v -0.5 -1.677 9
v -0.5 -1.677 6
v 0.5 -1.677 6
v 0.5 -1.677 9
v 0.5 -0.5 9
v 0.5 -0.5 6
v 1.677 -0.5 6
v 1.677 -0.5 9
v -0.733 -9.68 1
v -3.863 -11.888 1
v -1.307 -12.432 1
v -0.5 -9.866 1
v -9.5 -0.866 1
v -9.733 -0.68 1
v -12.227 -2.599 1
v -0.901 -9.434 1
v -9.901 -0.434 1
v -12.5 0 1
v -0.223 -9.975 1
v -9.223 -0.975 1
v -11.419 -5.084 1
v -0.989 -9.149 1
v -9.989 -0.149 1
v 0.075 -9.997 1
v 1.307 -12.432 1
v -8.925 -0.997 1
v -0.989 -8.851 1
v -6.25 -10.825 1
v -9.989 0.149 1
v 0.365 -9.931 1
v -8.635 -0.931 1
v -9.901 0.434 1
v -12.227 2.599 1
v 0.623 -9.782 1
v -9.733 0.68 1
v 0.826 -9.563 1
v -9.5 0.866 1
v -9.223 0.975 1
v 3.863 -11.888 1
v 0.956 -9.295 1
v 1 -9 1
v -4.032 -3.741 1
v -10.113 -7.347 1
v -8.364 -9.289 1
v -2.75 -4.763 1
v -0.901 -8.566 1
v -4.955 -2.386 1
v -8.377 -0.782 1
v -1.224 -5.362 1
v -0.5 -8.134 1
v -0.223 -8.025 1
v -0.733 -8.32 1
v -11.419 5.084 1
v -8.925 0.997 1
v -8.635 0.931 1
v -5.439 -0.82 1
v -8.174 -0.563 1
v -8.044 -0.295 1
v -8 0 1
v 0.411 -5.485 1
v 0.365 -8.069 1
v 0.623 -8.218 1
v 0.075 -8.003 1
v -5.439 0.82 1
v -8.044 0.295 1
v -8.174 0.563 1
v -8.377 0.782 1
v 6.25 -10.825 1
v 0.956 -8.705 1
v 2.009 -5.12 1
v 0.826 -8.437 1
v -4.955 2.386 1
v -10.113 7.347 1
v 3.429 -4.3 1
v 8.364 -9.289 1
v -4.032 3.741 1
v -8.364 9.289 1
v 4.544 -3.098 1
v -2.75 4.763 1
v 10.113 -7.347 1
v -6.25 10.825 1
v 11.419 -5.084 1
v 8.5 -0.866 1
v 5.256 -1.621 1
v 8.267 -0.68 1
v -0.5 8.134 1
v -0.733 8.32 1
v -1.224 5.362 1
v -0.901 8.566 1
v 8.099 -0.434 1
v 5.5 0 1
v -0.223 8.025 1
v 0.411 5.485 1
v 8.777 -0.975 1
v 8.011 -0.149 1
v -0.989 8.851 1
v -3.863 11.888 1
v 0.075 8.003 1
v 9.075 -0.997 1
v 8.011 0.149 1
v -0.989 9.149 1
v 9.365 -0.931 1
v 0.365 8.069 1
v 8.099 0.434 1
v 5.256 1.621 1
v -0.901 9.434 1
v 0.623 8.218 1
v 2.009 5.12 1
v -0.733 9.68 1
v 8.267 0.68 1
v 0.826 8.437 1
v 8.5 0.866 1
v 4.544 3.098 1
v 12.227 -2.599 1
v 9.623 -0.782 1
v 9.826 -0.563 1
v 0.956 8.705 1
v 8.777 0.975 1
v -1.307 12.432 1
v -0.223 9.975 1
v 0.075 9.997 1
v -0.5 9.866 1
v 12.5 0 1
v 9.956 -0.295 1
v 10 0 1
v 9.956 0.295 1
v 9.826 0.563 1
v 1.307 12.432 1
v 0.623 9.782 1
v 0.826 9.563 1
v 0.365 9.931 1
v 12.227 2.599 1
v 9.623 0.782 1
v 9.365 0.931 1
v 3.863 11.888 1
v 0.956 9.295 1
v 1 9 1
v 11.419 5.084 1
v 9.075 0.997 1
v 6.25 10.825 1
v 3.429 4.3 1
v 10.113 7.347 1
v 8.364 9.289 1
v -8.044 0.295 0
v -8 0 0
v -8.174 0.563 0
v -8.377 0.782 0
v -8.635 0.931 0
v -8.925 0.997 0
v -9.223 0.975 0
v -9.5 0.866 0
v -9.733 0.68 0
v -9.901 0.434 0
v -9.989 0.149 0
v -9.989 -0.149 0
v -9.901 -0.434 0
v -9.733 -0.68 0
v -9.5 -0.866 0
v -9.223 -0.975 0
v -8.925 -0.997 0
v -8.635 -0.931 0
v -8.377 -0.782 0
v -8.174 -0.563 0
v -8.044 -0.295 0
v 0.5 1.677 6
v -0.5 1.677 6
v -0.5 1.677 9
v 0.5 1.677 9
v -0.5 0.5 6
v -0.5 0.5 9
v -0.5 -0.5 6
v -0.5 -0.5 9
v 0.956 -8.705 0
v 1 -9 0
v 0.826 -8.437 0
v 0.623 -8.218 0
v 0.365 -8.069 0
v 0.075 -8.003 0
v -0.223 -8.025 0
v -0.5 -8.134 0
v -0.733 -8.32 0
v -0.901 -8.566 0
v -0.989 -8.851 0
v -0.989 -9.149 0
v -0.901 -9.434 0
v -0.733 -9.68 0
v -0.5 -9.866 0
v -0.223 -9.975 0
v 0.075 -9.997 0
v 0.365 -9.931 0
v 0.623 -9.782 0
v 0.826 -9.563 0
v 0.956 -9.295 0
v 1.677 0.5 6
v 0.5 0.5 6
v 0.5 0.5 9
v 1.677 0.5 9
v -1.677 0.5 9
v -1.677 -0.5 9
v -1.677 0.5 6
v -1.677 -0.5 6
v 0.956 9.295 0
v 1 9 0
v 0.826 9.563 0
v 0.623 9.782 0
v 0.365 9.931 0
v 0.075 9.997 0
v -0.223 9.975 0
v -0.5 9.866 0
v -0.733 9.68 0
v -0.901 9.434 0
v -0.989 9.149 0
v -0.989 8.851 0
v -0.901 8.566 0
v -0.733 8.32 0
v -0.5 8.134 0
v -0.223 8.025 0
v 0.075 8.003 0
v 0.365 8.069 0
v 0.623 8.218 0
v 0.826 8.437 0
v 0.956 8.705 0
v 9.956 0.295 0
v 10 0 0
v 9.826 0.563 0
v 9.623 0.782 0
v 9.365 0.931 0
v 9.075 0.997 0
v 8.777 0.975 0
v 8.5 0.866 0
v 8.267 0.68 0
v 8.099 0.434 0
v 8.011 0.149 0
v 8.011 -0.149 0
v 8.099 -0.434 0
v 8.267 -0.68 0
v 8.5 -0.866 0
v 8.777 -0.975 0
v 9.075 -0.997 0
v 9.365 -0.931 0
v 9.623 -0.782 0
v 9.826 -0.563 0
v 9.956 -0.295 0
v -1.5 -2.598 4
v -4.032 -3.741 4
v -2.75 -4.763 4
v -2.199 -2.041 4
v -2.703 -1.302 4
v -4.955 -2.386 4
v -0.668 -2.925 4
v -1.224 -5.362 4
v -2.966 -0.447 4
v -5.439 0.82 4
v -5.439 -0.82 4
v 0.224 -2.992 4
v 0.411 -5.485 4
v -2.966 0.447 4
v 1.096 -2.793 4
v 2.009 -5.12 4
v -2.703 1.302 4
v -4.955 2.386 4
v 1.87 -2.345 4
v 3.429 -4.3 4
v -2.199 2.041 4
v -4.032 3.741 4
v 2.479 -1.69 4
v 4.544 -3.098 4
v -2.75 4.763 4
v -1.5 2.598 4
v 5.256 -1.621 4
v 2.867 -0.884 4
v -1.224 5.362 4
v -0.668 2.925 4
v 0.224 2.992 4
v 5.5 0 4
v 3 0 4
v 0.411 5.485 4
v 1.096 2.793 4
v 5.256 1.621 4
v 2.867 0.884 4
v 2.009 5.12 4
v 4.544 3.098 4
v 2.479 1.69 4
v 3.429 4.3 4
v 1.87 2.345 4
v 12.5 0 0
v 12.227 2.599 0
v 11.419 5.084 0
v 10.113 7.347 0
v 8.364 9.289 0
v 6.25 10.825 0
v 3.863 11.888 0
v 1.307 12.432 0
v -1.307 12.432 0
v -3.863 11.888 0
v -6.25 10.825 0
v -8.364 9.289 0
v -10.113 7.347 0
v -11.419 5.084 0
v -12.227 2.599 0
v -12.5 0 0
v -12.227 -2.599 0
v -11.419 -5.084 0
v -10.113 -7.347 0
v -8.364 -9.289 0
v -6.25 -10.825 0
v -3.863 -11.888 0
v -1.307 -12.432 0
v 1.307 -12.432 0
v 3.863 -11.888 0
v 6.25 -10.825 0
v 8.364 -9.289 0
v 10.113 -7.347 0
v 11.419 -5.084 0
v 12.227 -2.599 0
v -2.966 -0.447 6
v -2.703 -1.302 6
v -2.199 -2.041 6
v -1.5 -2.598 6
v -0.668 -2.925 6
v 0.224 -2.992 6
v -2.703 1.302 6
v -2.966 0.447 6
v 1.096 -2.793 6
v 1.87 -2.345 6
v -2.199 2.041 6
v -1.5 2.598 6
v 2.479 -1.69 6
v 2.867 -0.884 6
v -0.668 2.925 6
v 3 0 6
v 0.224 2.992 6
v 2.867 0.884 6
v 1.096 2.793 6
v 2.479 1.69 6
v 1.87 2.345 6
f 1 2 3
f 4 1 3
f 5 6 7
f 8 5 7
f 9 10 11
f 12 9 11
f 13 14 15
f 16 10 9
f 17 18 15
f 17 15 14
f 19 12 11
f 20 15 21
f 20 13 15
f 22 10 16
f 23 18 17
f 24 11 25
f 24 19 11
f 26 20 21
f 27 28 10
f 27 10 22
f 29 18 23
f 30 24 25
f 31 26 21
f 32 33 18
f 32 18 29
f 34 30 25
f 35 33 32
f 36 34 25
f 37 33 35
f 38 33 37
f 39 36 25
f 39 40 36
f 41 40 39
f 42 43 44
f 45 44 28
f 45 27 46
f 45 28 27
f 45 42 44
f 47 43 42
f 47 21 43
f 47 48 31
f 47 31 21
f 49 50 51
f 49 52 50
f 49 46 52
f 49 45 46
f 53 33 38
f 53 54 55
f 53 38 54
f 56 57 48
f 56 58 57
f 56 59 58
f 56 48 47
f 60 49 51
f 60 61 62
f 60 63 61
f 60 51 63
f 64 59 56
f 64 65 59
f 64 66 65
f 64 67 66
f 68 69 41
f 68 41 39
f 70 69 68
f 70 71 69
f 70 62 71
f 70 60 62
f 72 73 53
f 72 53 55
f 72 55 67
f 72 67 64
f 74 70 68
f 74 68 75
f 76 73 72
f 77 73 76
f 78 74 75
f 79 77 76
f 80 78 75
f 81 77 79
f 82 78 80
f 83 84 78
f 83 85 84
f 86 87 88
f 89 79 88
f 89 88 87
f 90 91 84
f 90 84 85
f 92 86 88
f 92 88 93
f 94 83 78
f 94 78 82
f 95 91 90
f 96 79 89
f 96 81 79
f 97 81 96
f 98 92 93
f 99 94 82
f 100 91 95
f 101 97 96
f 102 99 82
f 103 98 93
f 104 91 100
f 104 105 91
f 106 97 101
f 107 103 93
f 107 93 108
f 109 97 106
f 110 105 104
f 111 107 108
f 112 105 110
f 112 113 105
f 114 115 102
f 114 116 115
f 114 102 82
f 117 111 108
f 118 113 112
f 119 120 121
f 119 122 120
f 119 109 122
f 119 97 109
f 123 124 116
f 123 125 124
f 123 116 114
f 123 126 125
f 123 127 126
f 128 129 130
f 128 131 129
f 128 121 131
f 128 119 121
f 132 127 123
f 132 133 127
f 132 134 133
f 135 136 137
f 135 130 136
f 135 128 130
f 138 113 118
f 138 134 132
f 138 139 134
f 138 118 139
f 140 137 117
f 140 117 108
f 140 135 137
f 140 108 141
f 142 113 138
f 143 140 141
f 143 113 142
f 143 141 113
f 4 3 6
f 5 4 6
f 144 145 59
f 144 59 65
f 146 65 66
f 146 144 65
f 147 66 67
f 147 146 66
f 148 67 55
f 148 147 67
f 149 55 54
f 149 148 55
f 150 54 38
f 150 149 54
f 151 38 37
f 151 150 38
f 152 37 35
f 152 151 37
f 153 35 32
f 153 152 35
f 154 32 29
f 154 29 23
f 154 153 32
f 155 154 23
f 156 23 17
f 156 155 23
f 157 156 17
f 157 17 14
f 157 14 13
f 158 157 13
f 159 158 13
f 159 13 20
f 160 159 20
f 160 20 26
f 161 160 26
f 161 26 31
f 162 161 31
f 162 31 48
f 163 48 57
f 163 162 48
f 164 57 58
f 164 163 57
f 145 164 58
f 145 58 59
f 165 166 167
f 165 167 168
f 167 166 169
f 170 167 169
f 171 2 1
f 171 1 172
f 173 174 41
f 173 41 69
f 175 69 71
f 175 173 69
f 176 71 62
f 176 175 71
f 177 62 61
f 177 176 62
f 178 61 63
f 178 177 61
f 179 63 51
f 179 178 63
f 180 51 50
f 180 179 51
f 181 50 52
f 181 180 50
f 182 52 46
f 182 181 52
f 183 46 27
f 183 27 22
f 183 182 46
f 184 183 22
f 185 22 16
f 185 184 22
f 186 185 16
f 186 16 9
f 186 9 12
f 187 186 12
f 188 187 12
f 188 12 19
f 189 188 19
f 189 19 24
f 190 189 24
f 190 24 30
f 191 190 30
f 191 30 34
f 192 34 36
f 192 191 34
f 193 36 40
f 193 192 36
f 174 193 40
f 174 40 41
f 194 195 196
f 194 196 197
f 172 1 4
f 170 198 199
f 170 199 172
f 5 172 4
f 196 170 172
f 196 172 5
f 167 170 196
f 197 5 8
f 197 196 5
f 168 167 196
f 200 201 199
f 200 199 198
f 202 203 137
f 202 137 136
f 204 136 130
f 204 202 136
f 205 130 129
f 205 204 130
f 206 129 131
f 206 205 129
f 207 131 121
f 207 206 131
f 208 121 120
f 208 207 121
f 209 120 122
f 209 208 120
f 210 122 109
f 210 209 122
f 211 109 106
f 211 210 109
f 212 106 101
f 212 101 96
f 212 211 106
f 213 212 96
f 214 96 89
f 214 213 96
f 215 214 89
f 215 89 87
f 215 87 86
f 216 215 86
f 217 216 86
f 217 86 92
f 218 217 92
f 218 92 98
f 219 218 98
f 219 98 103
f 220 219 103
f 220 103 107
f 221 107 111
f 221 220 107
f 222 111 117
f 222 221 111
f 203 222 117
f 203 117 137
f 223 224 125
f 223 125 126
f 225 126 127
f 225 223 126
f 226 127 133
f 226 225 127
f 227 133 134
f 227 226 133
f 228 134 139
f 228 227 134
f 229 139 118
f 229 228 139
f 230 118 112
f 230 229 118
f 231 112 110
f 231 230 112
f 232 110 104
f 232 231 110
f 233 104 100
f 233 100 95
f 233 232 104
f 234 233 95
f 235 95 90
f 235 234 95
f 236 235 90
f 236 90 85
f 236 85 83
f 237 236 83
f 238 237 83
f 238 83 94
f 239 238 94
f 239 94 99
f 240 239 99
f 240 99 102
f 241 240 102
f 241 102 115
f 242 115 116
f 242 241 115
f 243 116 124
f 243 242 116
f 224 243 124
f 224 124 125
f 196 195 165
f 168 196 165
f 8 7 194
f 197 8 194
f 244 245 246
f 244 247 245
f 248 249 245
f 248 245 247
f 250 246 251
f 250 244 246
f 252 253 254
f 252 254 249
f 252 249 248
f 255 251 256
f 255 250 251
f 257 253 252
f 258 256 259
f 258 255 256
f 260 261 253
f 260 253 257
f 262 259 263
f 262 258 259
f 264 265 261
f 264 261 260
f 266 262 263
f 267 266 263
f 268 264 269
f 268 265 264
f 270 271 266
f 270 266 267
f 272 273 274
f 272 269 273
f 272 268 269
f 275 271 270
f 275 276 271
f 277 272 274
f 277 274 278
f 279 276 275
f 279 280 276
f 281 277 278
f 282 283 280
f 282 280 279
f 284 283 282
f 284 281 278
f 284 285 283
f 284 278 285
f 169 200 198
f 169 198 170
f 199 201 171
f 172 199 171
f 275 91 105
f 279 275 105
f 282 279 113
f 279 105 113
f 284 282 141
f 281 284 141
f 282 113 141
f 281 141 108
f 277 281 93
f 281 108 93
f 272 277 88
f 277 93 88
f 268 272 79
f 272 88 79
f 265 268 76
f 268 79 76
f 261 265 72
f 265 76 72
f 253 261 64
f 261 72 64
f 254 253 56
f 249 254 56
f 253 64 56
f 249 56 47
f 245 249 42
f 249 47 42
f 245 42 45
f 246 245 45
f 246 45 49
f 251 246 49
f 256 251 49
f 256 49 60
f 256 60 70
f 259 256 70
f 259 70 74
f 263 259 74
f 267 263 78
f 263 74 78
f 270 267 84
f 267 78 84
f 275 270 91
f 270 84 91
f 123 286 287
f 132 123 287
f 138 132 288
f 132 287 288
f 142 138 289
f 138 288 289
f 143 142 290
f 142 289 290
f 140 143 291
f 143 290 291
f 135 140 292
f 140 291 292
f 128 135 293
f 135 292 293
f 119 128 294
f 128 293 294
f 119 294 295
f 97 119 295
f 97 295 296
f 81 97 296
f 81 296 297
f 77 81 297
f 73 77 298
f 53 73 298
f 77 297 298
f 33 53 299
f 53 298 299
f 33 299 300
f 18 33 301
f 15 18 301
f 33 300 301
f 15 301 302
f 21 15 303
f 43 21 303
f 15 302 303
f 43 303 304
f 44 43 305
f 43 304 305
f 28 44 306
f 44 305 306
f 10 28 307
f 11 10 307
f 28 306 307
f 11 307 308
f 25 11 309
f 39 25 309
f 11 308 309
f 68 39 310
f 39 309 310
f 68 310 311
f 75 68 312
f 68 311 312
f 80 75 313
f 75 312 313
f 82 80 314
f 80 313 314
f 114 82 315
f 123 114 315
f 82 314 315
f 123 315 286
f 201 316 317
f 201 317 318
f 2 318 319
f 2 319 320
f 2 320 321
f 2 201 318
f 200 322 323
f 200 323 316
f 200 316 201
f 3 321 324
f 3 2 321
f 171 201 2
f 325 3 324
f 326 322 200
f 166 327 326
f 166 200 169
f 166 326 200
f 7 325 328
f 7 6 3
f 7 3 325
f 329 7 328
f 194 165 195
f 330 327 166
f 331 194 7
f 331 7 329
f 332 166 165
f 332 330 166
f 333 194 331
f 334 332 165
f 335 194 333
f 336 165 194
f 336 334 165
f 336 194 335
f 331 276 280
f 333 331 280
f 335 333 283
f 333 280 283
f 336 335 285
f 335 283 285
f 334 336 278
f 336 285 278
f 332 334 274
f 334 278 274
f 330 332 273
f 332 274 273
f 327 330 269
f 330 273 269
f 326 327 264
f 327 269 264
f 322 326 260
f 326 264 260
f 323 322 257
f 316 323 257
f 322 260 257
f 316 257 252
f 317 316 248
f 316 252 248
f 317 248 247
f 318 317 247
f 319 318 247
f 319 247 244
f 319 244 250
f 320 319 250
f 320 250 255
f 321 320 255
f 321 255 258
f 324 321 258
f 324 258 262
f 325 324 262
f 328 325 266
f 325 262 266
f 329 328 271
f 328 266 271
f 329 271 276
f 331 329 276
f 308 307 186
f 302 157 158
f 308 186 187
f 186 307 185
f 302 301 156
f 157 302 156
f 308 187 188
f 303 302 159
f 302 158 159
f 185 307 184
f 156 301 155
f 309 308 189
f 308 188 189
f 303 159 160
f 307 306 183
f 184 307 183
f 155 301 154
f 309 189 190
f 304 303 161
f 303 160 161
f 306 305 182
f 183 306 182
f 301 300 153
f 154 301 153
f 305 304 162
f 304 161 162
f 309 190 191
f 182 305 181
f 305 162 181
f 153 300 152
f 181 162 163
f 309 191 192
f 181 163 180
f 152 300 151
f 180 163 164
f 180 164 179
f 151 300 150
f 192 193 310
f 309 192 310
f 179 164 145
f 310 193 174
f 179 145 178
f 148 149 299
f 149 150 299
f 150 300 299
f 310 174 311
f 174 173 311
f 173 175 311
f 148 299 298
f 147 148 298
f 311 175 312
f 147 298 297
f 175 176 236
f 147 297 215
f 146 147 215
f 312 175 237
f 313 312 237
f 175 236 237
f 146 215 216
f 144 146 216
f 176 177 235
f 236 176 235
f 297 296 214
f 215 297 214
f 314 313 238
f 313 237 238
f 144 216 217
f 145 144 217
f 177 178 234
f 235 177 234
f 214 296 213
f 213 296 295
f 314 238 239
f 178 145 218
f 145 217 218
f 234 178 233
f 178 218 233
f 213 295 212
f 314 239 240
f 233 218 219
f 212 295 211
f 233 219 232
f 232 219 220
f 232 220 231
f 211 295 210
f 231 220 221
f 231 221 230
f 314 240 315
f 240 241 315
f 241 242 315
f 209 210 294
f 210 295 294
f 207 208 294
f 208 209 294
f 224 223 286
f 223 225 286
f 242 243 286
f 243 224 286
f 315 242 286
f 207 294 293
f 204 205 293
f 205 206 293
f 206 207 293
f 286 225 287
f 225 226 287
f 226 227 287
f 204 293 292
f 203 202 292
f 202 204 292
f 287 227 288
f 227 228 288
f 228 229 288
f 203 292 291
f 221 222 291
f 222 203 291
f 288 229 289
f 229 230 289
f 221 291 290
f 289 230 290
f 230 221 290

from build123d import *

# Parameters (mm, degrees)
F0_R     = 12.5
F0_R_2   = 1
F1_DEPTH = 1
F2_R     = 5.5
F3_DEPTH = 3
F4_R     = 3
F5_DEPTH = 2
F6_W     = 1
F6_H     = 1.1770509831
F6_H_2   = 1
F6_W_2   = 1.1770509831
F7_DEPTH = 3


with BuildPart() as f1:
    # F0 (on Top) → F1 (new body)
    with BuildSketch(Plane.XY):
        Circle(F0_R)
        with Locations((0, -9)):
            Circle(F0_R_2, mode=Mode.SUBTRACT)
        with Locations((-9, 0)):
            Circle(F0_R_2, mode=Mode.SUBTRACT)
        with Locations((9, 0)):
            Circle(F0_R_2, mode=Mode.SUBTRACT)
        with Locations((0, 9)):
            Circle(F0_R_2, mode=Mode.SUBTRACT)
    extrude(amount=F1_DEPTH)

    # F2 (on face) → F3 (join)
    with BuildSketch(Plane.XY.offset(1)):
        Circle(F2_R)
    extrude(amount=F3_DEPTH)

    # F4 (on face) → F5 (join)
    with BuildSketch(Plane.XY.offset(4)):
        Circle(F4_R)
    extrude(amount=F5_DEPTH)

    # F6 (on face) → F7 (join)
    with BuildSketch(Plane.XY.offset(6)):
        with Locations((0, 1.0885254916)):
            Rectangle(F6_W, F6_H)
        Rectangle(F6_W, F6_H_2)
        with Locations((-1.0885254916, 0)):
            Rectangle(F6_W_2, F6_H_2)
        with Locations((1.0885254916, 0)):
            Rectangle(F6_W_2, F6_H_2)
        with Locations((0, -1.0885254916)):
            Rectangle(F6_W, F6_H)
    extrude(amount=F7_DEPTH)


solid = f1.part
